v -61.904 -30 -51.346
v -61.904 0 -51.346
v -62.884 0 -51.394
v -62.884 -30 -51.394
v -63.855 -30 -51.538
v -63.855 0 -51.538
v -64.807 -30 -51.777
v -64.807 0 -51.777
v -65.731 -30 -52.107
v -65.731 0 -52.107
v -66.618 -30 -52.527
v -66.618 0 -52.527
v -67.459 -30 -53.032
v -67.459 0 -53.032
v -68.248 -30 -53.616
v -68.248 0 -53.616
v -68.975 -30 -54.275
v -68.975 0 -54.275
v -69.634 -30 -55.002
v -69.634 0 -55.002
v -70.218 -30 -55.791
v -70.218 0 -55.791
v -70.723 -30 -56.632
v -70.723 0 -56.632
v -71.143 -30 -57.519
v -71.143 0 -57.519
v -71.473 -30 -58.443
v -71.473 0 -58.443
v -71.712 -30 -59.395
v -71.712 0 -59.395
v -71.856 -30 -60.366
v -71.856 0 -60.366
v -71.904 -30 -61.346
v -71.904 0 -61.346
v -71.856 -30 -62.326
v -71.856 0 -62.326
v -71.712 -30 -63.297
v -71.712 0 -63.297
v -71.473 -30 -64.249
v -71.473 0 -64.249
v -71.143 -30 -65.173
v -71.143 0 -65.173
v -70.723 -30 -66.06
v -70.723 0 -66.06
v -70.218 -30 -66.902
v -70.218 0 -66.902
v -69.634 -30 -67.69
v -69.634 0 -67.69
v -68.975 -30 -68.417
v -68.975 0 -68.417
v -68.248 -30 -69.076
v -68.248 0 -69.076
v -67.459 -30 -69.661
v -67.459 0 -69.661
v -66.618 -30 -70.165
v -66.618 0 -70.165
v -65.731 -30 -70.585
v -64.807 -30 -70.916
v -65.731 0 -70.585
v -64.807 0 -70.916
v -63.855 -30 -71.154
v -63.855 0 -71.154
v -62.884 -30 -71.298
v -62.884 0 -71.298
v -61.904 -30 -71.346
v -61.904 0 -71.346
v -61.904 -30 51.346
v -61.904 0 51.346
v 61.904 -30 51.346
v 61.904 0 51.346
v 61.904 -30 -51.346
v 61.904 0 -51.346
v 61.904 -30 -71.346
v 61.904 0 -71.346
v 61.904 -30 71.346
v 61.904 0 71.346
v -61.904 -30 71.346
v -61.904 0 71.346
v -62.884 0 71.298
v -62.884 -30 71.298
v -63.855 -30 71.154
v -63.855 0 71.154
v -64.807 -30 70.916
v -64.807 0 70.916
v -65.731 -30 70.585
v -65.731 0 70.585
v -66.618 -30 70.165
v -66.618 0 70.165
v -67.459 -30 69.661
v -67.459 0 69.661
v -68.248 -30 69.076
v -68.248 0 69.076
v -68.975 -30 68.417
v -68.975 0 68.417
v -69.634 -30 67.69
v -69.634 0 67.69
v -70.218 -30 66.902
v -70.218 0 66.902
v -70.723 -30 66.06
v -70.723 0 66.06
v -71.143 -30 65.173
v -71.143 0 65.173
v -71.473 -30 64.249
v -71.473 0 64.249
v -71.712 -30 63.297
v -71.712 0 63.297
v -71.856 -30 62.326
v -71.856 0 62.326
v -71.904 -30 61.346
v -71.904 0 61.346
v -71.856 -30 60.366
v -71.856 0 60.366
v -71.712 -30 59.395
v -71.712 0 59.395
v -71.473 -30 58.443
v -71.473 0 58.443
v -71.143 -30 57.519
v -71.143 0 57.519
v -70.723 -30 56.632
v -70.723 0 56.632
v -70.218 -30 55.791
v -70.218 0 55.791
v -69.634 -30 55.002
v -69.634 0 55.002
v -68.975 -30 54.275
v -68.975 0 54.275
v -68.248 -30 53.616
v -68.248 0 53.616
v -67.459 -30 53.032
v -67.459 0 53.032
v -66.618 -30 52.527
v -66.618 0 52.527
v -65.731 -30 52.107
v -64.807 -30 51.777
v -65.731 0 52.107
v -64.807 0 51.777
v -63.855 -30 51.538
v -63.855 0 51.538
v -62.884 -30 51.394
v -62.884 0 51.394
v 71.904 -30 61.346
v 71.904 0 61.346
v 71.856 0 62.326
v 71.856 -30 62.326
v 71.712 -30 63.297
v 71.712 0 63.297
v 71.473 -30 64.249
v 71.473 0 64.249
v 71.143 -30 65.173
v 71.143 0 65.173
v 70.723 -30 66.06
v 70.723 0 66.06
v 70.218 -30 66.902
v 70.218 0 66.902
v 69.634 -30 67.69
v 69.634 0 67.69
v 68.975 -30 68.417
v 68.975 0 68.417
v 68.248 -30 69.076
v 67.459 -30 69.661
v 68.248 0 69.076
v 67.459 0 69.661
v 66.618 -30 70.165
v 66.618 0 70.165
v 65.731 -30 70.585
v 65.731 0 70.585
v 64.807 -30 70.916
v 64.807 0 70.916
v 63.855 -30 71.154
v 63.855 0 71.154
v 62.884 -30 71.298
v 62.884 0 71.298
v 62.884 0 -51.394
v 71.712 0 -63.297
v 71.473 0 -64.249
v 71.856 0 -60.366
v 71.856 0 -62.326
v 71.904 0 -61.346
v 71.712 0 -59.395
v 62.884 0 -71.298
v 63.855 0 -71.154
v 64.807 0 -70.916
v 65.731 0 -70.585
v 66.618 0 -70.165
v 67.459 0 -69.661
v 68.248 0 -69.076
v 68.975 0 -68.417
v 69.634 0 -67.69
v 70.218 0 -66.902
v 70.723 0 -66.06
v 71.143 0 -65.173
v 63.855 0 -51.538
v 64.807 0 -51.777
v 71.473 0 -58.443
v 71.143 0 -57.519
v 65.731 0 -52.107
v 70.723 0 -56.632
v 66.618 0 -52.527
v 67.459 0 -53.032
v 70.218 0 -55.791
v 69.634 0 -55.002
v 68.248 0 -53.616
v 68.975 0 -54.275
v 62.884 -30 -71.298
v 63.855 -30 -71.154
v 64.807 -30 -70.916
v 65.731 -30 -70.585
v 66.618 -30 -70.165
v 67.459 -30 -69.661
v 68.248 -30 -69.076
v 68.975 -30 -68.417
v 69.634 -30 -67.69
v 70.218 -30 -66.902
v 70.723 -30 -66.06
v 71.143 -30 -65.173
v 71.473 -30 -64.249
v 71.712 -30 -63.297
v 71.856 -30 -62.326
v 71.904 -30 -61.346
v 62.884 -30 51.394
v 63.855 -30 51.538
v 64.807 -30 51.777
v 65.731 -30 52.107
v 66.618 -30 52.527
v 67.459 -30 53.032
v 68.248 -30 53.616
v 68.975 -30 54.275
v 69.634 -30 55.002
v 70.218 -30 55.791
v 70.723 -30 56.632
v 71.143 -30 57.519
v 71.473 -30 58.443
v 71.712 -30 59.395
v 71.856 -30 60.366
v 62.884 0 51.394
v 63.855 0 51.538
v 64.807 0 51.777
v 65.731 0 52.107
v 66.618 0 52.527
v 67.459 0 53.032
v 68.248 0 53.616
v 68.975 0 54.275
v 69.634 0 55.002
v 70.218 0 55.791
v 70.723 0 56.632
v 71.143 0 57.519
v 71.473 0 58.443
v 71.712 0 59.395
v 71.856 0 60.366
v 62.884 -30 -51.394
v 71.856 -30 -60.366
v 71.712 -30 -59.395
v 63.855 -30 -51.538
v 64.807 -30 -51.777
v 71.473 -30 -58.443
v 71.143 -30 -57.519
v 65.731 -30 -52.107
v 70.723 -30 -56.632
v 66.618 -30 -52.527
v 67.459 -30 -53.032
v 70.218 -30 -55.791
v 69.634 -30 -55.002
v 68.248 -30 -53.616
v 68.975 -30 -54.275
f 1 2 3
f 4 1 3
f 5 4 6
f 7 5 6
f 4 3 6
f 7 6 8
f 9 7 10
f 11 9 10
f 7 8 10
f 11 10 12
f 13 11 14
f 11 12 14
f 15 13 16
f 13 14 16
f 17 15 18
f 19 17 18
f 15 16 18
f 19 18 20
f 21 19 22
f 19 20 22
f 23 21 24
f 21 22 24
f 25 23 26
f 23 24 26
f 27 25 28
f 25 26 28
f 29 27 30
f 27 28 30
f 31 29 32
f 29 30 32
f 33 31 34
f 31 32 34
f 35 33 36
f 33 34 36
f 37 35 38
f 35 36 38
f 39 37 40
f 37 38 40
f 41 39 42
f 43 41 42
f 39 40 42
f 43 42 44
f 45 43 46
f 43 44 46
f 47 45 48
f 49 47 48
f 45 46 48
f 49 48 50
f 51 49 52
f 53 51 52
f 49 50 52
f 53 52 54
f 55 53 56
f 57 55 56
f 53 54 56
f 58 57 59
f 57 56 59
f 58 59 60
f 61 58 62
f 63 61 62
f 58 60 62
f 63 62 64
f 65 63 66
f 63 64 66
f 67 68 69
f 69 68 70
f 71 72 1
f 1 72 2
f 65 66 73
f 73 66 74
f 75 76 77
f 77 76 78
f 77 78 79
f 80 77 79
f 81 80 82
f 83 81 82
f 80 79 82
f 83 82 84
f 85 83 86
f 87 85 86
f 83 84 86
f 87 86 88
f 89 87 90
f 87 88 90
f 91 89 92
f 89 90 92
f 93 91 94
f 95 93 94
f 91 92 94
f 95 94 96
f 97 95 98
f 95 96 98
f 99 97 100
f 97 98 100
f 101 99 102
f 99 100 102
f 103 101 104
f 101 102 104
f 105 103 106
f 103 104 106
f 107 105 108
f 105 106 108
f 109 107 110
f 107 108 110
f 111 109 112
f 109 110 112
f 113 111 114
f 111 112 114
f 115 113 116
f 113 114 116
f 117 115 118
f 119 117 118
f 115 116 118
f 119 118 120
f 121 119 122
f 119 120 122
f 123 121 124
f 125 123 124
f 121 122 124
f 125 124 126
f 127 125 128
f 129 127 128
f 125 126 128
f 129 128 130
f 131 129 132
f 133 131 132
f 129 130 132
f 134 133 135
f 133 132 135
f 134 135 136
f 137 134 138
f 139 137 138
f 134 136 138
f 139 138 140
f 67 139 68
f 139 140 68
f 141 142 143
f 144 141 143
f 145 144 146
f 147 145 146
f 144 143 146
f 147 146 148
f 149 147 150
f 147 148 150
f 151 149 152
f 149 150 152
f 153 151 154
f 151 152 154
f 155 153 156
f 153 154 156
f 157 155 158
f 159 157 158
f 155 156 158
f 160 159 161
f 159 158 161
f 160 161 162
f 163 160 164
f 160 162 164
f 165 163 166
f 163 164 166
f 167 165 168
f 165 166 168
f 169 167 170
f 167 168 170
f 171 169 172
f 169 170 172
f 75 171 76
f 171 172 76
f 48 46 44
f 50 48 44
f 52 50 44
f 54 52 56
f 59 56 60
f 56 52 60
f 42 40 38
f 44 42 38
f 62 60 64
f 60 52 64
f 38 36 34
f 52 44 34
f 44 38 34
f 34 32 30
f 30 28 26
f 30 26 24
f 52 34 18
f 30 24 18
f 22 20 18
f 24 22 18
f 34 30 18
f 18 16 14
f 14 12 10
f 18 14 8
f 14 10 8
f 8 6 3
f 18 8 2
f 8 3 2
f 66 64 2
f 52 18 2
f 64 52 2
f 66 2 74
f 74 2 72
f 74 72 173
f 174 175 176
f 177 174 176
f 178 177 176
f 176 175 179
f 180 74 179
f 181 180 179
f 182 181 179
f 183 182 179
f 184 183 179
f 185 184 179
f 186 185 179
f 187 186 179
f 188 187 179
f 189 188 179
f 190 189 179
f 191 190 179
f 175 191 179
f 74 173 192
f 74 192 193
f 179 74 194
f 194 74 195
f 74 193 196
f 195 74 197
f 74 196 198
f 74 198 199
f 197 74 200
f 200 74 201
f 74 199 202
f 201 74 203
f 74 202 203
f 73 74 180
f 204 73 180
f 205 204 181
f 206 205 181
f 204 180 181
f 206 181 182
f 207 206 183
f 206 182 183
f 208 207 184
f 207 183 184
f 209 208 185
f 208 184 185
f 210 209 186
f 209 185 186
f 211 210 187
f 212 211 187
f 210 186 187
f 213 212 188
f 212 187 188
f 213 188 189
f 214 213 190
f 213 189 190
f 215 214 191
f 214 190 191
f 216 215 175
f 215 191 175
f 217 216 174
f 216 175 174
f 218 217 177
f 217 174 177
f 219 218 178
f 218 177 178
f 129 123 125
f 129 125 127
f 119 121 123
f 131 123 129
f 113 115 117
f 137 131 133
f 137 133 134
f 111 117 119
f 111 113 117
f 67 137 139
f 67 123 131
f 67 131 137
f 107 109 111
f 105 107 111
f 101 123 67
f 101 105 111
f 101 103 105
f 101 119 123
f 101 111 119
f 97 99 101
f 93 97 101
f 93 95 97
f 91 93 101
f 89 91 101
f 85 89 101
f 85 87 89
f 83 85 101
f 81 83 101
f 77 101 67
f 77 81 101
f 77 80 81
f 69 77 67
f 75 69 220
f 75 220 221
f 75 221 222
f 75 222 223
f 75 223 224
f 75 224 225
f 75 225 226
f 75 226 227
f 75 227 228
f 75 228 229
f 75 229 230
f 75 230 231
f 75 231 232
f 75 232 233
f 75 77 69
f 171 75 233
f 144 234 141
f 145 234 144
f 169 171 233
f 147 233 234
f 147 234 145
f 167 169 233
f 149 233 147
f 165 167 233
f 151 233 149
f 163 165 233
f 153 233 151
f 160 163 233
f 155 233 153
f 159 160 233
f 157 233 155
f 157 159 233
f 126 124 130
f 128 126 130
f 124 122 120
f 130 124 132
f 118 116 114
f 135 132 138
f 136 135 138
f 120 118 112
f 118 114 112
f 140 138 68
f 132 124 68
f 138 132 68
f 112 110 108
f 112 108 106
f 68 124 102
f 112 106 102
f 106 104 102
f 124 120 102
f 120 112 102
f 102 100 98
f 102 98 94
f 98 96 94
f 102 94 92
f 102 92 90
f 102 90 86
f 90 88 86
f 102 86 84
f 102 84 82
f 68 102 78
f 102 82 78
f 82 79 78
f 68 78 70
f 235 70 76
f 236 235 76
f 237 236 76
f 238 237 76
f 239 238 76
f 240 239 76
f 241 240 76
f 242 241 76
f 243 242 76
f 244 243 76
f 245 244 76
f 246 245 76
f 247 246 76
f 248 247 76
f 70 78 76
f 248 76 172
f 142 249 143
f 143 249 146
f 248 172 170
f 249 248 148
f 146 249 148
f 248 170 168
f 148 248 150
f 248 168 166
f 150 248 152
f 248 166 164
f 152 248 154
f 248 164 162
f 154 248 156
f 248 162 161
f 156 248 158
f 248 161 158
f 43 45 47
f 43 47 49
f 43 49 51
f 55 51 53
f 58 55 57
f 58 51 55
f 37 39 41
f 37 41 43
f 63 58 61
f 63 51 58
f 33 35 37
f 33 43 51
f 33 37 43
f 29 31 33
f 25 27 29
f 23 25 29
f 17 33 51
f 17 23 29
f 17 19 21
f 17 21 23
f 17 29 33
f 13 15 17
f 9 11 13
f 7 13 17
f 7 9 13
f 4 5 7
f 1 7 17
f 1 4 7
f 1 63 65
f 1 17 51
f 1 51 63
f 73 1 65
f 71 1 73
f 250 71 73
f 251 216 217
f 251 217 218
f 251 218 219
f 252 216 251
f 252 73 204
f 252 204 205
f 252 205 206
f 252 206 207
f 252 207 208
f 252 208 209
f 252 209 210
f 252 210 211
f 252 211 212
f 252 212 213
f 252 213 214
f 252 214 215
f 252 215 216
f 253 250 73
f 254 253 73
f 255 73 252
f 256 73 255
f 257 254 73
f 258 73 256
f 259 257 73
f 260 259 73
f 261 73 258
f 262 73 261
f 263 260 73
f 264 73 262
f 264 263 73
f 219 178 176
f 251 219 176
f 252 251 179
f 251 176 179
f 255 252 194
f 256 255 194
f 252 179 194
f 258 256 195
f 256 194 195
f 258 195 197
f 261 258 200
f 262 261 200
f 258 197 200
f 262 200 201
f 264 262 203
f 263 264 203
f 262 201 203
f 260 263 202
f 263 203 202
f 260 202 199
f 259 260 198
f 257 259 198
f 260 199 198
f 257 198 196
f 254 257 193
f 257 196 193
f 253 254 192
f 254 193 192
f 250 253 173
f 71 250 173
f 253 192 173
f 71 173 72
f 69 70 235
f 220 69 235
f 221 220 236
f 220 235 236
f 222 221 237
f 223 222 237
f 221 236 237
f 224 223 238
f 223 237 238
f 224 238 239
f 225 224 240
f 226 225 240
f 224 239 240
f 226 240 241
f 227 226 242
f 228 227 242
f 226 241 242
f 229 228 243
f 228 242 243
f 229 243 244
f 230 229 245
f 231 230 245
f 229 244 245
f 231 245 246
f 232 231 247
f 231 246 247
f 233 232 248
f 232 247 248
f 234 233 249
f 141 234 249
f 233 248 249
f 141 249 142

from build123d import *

# Parameters (mm, degrees)
F1_DEPTH = 30


with BuildPart() as f1:
    # F0 (on Front) → F1 (new body)
    with BuildSketch(Plane.XZ):
        with BuildLine():
            ThreePointArc((-61.903773, 71.346248), (-54.832705, 68.417316), (-51.903773, 61.346248))
            ThreePointArc((-51.903773, 61.346248), (-54.832705, 54.275181), (-61.903773, 51.346248))
            Line((-61.903773, 51.346248), (0, 51.346248))
            Line((0, 51.346248), (0, 71.346248))
            Line((0, 71.346248), (-61.903773, 71.346248))
        make_face()
        with BuildLine():
            Line((61.903773, 71.346248), (0, 71.346248))
            Line((0, 71.346248), (0, 51.346248))
            Line((0, 51.346248), (61.903773, 51.346248))
            ThreePointArc((61.903773, 51.346248), (51.903773, 61.346248), (61.903773, 71.346248))
        make_face()
        with BuildLine():
            ThreePointArc((-61.903773, 51.346248), (-54.832705, 54.275181), (-51.903773, 61.346248))
            ThreePointArc((-51.903773, 61.346248), (-54.832705, 68.417316), (-61.903773, 71.346248))
            ThreePointArc((-61.903773, 71.346248), (-71.903773, 61.346248), (-61.903773, 51.346248))
        make_face()
        with BuildLine():
            ThreePointArc((71.903773, 61.346248), (68.974841, 68.417316), (61.903773, 71.346248))
            ThreePointArc((61.903773, 71.346248), (51.903773, 61.346248), (61.903773, 51.346248))
            ThreePointArc((61.903773, 51.346248), (68.974841, 54.275181), (71.903773, 61.346248))
        make_face()
        with BuildLine():
            ThreePointArc((71.903773, -61.346248), (68.974841, -54.275181), (61.903773, -51.346248))
            ThreePointArc((61.903773, -51.346248), (51.903773, -61.346248), (61.903773, -71.346248))
            ThreePointArc((61.903773, -71.346248), (68.974841, -68.417316), (71.903773, -61.346248))
        make_face()
        with BuildLine():
            ThreePointArc((-61.903773, -71.346248), (-54.832705, -68.417316), (-51.903773, -61.346248))
            ThreePointArc((-51.903773, -61.346248), (-54.832705, -54.275181), (-61.903773, -51.346248))
            ThreePointArc((-61.903773, -51.346248), (-71.903773, -61.346248), (-61.903773, -71.346248))
        make_face()
        with BuildLine():
            ThreePointArc((-61.903773, -51.346248), (-54.832705, -54.275181), (-51.903773, -61.346248))
            ThreePointArc((-51.903773, -61.346248), (-54.832705, -68.417316), (-61.903773, -71.346248))
            Line((-61.903773, -71.346248), (0, -71.346248))
            Line((0, -71.346248), (61.903773, -71.346248))
            ThreePointArc((61.903773, -71.346248), (51.903773, -61.346248), (61.903773, -51.346248))
            Line((61.903773, -51.346248), (0, -51.346248))
            Line((0, -51.346248), (-61.903773, -51.346248))
        make_face()
    extrude(amount=F1_DEPTH)


solid = f1.part
